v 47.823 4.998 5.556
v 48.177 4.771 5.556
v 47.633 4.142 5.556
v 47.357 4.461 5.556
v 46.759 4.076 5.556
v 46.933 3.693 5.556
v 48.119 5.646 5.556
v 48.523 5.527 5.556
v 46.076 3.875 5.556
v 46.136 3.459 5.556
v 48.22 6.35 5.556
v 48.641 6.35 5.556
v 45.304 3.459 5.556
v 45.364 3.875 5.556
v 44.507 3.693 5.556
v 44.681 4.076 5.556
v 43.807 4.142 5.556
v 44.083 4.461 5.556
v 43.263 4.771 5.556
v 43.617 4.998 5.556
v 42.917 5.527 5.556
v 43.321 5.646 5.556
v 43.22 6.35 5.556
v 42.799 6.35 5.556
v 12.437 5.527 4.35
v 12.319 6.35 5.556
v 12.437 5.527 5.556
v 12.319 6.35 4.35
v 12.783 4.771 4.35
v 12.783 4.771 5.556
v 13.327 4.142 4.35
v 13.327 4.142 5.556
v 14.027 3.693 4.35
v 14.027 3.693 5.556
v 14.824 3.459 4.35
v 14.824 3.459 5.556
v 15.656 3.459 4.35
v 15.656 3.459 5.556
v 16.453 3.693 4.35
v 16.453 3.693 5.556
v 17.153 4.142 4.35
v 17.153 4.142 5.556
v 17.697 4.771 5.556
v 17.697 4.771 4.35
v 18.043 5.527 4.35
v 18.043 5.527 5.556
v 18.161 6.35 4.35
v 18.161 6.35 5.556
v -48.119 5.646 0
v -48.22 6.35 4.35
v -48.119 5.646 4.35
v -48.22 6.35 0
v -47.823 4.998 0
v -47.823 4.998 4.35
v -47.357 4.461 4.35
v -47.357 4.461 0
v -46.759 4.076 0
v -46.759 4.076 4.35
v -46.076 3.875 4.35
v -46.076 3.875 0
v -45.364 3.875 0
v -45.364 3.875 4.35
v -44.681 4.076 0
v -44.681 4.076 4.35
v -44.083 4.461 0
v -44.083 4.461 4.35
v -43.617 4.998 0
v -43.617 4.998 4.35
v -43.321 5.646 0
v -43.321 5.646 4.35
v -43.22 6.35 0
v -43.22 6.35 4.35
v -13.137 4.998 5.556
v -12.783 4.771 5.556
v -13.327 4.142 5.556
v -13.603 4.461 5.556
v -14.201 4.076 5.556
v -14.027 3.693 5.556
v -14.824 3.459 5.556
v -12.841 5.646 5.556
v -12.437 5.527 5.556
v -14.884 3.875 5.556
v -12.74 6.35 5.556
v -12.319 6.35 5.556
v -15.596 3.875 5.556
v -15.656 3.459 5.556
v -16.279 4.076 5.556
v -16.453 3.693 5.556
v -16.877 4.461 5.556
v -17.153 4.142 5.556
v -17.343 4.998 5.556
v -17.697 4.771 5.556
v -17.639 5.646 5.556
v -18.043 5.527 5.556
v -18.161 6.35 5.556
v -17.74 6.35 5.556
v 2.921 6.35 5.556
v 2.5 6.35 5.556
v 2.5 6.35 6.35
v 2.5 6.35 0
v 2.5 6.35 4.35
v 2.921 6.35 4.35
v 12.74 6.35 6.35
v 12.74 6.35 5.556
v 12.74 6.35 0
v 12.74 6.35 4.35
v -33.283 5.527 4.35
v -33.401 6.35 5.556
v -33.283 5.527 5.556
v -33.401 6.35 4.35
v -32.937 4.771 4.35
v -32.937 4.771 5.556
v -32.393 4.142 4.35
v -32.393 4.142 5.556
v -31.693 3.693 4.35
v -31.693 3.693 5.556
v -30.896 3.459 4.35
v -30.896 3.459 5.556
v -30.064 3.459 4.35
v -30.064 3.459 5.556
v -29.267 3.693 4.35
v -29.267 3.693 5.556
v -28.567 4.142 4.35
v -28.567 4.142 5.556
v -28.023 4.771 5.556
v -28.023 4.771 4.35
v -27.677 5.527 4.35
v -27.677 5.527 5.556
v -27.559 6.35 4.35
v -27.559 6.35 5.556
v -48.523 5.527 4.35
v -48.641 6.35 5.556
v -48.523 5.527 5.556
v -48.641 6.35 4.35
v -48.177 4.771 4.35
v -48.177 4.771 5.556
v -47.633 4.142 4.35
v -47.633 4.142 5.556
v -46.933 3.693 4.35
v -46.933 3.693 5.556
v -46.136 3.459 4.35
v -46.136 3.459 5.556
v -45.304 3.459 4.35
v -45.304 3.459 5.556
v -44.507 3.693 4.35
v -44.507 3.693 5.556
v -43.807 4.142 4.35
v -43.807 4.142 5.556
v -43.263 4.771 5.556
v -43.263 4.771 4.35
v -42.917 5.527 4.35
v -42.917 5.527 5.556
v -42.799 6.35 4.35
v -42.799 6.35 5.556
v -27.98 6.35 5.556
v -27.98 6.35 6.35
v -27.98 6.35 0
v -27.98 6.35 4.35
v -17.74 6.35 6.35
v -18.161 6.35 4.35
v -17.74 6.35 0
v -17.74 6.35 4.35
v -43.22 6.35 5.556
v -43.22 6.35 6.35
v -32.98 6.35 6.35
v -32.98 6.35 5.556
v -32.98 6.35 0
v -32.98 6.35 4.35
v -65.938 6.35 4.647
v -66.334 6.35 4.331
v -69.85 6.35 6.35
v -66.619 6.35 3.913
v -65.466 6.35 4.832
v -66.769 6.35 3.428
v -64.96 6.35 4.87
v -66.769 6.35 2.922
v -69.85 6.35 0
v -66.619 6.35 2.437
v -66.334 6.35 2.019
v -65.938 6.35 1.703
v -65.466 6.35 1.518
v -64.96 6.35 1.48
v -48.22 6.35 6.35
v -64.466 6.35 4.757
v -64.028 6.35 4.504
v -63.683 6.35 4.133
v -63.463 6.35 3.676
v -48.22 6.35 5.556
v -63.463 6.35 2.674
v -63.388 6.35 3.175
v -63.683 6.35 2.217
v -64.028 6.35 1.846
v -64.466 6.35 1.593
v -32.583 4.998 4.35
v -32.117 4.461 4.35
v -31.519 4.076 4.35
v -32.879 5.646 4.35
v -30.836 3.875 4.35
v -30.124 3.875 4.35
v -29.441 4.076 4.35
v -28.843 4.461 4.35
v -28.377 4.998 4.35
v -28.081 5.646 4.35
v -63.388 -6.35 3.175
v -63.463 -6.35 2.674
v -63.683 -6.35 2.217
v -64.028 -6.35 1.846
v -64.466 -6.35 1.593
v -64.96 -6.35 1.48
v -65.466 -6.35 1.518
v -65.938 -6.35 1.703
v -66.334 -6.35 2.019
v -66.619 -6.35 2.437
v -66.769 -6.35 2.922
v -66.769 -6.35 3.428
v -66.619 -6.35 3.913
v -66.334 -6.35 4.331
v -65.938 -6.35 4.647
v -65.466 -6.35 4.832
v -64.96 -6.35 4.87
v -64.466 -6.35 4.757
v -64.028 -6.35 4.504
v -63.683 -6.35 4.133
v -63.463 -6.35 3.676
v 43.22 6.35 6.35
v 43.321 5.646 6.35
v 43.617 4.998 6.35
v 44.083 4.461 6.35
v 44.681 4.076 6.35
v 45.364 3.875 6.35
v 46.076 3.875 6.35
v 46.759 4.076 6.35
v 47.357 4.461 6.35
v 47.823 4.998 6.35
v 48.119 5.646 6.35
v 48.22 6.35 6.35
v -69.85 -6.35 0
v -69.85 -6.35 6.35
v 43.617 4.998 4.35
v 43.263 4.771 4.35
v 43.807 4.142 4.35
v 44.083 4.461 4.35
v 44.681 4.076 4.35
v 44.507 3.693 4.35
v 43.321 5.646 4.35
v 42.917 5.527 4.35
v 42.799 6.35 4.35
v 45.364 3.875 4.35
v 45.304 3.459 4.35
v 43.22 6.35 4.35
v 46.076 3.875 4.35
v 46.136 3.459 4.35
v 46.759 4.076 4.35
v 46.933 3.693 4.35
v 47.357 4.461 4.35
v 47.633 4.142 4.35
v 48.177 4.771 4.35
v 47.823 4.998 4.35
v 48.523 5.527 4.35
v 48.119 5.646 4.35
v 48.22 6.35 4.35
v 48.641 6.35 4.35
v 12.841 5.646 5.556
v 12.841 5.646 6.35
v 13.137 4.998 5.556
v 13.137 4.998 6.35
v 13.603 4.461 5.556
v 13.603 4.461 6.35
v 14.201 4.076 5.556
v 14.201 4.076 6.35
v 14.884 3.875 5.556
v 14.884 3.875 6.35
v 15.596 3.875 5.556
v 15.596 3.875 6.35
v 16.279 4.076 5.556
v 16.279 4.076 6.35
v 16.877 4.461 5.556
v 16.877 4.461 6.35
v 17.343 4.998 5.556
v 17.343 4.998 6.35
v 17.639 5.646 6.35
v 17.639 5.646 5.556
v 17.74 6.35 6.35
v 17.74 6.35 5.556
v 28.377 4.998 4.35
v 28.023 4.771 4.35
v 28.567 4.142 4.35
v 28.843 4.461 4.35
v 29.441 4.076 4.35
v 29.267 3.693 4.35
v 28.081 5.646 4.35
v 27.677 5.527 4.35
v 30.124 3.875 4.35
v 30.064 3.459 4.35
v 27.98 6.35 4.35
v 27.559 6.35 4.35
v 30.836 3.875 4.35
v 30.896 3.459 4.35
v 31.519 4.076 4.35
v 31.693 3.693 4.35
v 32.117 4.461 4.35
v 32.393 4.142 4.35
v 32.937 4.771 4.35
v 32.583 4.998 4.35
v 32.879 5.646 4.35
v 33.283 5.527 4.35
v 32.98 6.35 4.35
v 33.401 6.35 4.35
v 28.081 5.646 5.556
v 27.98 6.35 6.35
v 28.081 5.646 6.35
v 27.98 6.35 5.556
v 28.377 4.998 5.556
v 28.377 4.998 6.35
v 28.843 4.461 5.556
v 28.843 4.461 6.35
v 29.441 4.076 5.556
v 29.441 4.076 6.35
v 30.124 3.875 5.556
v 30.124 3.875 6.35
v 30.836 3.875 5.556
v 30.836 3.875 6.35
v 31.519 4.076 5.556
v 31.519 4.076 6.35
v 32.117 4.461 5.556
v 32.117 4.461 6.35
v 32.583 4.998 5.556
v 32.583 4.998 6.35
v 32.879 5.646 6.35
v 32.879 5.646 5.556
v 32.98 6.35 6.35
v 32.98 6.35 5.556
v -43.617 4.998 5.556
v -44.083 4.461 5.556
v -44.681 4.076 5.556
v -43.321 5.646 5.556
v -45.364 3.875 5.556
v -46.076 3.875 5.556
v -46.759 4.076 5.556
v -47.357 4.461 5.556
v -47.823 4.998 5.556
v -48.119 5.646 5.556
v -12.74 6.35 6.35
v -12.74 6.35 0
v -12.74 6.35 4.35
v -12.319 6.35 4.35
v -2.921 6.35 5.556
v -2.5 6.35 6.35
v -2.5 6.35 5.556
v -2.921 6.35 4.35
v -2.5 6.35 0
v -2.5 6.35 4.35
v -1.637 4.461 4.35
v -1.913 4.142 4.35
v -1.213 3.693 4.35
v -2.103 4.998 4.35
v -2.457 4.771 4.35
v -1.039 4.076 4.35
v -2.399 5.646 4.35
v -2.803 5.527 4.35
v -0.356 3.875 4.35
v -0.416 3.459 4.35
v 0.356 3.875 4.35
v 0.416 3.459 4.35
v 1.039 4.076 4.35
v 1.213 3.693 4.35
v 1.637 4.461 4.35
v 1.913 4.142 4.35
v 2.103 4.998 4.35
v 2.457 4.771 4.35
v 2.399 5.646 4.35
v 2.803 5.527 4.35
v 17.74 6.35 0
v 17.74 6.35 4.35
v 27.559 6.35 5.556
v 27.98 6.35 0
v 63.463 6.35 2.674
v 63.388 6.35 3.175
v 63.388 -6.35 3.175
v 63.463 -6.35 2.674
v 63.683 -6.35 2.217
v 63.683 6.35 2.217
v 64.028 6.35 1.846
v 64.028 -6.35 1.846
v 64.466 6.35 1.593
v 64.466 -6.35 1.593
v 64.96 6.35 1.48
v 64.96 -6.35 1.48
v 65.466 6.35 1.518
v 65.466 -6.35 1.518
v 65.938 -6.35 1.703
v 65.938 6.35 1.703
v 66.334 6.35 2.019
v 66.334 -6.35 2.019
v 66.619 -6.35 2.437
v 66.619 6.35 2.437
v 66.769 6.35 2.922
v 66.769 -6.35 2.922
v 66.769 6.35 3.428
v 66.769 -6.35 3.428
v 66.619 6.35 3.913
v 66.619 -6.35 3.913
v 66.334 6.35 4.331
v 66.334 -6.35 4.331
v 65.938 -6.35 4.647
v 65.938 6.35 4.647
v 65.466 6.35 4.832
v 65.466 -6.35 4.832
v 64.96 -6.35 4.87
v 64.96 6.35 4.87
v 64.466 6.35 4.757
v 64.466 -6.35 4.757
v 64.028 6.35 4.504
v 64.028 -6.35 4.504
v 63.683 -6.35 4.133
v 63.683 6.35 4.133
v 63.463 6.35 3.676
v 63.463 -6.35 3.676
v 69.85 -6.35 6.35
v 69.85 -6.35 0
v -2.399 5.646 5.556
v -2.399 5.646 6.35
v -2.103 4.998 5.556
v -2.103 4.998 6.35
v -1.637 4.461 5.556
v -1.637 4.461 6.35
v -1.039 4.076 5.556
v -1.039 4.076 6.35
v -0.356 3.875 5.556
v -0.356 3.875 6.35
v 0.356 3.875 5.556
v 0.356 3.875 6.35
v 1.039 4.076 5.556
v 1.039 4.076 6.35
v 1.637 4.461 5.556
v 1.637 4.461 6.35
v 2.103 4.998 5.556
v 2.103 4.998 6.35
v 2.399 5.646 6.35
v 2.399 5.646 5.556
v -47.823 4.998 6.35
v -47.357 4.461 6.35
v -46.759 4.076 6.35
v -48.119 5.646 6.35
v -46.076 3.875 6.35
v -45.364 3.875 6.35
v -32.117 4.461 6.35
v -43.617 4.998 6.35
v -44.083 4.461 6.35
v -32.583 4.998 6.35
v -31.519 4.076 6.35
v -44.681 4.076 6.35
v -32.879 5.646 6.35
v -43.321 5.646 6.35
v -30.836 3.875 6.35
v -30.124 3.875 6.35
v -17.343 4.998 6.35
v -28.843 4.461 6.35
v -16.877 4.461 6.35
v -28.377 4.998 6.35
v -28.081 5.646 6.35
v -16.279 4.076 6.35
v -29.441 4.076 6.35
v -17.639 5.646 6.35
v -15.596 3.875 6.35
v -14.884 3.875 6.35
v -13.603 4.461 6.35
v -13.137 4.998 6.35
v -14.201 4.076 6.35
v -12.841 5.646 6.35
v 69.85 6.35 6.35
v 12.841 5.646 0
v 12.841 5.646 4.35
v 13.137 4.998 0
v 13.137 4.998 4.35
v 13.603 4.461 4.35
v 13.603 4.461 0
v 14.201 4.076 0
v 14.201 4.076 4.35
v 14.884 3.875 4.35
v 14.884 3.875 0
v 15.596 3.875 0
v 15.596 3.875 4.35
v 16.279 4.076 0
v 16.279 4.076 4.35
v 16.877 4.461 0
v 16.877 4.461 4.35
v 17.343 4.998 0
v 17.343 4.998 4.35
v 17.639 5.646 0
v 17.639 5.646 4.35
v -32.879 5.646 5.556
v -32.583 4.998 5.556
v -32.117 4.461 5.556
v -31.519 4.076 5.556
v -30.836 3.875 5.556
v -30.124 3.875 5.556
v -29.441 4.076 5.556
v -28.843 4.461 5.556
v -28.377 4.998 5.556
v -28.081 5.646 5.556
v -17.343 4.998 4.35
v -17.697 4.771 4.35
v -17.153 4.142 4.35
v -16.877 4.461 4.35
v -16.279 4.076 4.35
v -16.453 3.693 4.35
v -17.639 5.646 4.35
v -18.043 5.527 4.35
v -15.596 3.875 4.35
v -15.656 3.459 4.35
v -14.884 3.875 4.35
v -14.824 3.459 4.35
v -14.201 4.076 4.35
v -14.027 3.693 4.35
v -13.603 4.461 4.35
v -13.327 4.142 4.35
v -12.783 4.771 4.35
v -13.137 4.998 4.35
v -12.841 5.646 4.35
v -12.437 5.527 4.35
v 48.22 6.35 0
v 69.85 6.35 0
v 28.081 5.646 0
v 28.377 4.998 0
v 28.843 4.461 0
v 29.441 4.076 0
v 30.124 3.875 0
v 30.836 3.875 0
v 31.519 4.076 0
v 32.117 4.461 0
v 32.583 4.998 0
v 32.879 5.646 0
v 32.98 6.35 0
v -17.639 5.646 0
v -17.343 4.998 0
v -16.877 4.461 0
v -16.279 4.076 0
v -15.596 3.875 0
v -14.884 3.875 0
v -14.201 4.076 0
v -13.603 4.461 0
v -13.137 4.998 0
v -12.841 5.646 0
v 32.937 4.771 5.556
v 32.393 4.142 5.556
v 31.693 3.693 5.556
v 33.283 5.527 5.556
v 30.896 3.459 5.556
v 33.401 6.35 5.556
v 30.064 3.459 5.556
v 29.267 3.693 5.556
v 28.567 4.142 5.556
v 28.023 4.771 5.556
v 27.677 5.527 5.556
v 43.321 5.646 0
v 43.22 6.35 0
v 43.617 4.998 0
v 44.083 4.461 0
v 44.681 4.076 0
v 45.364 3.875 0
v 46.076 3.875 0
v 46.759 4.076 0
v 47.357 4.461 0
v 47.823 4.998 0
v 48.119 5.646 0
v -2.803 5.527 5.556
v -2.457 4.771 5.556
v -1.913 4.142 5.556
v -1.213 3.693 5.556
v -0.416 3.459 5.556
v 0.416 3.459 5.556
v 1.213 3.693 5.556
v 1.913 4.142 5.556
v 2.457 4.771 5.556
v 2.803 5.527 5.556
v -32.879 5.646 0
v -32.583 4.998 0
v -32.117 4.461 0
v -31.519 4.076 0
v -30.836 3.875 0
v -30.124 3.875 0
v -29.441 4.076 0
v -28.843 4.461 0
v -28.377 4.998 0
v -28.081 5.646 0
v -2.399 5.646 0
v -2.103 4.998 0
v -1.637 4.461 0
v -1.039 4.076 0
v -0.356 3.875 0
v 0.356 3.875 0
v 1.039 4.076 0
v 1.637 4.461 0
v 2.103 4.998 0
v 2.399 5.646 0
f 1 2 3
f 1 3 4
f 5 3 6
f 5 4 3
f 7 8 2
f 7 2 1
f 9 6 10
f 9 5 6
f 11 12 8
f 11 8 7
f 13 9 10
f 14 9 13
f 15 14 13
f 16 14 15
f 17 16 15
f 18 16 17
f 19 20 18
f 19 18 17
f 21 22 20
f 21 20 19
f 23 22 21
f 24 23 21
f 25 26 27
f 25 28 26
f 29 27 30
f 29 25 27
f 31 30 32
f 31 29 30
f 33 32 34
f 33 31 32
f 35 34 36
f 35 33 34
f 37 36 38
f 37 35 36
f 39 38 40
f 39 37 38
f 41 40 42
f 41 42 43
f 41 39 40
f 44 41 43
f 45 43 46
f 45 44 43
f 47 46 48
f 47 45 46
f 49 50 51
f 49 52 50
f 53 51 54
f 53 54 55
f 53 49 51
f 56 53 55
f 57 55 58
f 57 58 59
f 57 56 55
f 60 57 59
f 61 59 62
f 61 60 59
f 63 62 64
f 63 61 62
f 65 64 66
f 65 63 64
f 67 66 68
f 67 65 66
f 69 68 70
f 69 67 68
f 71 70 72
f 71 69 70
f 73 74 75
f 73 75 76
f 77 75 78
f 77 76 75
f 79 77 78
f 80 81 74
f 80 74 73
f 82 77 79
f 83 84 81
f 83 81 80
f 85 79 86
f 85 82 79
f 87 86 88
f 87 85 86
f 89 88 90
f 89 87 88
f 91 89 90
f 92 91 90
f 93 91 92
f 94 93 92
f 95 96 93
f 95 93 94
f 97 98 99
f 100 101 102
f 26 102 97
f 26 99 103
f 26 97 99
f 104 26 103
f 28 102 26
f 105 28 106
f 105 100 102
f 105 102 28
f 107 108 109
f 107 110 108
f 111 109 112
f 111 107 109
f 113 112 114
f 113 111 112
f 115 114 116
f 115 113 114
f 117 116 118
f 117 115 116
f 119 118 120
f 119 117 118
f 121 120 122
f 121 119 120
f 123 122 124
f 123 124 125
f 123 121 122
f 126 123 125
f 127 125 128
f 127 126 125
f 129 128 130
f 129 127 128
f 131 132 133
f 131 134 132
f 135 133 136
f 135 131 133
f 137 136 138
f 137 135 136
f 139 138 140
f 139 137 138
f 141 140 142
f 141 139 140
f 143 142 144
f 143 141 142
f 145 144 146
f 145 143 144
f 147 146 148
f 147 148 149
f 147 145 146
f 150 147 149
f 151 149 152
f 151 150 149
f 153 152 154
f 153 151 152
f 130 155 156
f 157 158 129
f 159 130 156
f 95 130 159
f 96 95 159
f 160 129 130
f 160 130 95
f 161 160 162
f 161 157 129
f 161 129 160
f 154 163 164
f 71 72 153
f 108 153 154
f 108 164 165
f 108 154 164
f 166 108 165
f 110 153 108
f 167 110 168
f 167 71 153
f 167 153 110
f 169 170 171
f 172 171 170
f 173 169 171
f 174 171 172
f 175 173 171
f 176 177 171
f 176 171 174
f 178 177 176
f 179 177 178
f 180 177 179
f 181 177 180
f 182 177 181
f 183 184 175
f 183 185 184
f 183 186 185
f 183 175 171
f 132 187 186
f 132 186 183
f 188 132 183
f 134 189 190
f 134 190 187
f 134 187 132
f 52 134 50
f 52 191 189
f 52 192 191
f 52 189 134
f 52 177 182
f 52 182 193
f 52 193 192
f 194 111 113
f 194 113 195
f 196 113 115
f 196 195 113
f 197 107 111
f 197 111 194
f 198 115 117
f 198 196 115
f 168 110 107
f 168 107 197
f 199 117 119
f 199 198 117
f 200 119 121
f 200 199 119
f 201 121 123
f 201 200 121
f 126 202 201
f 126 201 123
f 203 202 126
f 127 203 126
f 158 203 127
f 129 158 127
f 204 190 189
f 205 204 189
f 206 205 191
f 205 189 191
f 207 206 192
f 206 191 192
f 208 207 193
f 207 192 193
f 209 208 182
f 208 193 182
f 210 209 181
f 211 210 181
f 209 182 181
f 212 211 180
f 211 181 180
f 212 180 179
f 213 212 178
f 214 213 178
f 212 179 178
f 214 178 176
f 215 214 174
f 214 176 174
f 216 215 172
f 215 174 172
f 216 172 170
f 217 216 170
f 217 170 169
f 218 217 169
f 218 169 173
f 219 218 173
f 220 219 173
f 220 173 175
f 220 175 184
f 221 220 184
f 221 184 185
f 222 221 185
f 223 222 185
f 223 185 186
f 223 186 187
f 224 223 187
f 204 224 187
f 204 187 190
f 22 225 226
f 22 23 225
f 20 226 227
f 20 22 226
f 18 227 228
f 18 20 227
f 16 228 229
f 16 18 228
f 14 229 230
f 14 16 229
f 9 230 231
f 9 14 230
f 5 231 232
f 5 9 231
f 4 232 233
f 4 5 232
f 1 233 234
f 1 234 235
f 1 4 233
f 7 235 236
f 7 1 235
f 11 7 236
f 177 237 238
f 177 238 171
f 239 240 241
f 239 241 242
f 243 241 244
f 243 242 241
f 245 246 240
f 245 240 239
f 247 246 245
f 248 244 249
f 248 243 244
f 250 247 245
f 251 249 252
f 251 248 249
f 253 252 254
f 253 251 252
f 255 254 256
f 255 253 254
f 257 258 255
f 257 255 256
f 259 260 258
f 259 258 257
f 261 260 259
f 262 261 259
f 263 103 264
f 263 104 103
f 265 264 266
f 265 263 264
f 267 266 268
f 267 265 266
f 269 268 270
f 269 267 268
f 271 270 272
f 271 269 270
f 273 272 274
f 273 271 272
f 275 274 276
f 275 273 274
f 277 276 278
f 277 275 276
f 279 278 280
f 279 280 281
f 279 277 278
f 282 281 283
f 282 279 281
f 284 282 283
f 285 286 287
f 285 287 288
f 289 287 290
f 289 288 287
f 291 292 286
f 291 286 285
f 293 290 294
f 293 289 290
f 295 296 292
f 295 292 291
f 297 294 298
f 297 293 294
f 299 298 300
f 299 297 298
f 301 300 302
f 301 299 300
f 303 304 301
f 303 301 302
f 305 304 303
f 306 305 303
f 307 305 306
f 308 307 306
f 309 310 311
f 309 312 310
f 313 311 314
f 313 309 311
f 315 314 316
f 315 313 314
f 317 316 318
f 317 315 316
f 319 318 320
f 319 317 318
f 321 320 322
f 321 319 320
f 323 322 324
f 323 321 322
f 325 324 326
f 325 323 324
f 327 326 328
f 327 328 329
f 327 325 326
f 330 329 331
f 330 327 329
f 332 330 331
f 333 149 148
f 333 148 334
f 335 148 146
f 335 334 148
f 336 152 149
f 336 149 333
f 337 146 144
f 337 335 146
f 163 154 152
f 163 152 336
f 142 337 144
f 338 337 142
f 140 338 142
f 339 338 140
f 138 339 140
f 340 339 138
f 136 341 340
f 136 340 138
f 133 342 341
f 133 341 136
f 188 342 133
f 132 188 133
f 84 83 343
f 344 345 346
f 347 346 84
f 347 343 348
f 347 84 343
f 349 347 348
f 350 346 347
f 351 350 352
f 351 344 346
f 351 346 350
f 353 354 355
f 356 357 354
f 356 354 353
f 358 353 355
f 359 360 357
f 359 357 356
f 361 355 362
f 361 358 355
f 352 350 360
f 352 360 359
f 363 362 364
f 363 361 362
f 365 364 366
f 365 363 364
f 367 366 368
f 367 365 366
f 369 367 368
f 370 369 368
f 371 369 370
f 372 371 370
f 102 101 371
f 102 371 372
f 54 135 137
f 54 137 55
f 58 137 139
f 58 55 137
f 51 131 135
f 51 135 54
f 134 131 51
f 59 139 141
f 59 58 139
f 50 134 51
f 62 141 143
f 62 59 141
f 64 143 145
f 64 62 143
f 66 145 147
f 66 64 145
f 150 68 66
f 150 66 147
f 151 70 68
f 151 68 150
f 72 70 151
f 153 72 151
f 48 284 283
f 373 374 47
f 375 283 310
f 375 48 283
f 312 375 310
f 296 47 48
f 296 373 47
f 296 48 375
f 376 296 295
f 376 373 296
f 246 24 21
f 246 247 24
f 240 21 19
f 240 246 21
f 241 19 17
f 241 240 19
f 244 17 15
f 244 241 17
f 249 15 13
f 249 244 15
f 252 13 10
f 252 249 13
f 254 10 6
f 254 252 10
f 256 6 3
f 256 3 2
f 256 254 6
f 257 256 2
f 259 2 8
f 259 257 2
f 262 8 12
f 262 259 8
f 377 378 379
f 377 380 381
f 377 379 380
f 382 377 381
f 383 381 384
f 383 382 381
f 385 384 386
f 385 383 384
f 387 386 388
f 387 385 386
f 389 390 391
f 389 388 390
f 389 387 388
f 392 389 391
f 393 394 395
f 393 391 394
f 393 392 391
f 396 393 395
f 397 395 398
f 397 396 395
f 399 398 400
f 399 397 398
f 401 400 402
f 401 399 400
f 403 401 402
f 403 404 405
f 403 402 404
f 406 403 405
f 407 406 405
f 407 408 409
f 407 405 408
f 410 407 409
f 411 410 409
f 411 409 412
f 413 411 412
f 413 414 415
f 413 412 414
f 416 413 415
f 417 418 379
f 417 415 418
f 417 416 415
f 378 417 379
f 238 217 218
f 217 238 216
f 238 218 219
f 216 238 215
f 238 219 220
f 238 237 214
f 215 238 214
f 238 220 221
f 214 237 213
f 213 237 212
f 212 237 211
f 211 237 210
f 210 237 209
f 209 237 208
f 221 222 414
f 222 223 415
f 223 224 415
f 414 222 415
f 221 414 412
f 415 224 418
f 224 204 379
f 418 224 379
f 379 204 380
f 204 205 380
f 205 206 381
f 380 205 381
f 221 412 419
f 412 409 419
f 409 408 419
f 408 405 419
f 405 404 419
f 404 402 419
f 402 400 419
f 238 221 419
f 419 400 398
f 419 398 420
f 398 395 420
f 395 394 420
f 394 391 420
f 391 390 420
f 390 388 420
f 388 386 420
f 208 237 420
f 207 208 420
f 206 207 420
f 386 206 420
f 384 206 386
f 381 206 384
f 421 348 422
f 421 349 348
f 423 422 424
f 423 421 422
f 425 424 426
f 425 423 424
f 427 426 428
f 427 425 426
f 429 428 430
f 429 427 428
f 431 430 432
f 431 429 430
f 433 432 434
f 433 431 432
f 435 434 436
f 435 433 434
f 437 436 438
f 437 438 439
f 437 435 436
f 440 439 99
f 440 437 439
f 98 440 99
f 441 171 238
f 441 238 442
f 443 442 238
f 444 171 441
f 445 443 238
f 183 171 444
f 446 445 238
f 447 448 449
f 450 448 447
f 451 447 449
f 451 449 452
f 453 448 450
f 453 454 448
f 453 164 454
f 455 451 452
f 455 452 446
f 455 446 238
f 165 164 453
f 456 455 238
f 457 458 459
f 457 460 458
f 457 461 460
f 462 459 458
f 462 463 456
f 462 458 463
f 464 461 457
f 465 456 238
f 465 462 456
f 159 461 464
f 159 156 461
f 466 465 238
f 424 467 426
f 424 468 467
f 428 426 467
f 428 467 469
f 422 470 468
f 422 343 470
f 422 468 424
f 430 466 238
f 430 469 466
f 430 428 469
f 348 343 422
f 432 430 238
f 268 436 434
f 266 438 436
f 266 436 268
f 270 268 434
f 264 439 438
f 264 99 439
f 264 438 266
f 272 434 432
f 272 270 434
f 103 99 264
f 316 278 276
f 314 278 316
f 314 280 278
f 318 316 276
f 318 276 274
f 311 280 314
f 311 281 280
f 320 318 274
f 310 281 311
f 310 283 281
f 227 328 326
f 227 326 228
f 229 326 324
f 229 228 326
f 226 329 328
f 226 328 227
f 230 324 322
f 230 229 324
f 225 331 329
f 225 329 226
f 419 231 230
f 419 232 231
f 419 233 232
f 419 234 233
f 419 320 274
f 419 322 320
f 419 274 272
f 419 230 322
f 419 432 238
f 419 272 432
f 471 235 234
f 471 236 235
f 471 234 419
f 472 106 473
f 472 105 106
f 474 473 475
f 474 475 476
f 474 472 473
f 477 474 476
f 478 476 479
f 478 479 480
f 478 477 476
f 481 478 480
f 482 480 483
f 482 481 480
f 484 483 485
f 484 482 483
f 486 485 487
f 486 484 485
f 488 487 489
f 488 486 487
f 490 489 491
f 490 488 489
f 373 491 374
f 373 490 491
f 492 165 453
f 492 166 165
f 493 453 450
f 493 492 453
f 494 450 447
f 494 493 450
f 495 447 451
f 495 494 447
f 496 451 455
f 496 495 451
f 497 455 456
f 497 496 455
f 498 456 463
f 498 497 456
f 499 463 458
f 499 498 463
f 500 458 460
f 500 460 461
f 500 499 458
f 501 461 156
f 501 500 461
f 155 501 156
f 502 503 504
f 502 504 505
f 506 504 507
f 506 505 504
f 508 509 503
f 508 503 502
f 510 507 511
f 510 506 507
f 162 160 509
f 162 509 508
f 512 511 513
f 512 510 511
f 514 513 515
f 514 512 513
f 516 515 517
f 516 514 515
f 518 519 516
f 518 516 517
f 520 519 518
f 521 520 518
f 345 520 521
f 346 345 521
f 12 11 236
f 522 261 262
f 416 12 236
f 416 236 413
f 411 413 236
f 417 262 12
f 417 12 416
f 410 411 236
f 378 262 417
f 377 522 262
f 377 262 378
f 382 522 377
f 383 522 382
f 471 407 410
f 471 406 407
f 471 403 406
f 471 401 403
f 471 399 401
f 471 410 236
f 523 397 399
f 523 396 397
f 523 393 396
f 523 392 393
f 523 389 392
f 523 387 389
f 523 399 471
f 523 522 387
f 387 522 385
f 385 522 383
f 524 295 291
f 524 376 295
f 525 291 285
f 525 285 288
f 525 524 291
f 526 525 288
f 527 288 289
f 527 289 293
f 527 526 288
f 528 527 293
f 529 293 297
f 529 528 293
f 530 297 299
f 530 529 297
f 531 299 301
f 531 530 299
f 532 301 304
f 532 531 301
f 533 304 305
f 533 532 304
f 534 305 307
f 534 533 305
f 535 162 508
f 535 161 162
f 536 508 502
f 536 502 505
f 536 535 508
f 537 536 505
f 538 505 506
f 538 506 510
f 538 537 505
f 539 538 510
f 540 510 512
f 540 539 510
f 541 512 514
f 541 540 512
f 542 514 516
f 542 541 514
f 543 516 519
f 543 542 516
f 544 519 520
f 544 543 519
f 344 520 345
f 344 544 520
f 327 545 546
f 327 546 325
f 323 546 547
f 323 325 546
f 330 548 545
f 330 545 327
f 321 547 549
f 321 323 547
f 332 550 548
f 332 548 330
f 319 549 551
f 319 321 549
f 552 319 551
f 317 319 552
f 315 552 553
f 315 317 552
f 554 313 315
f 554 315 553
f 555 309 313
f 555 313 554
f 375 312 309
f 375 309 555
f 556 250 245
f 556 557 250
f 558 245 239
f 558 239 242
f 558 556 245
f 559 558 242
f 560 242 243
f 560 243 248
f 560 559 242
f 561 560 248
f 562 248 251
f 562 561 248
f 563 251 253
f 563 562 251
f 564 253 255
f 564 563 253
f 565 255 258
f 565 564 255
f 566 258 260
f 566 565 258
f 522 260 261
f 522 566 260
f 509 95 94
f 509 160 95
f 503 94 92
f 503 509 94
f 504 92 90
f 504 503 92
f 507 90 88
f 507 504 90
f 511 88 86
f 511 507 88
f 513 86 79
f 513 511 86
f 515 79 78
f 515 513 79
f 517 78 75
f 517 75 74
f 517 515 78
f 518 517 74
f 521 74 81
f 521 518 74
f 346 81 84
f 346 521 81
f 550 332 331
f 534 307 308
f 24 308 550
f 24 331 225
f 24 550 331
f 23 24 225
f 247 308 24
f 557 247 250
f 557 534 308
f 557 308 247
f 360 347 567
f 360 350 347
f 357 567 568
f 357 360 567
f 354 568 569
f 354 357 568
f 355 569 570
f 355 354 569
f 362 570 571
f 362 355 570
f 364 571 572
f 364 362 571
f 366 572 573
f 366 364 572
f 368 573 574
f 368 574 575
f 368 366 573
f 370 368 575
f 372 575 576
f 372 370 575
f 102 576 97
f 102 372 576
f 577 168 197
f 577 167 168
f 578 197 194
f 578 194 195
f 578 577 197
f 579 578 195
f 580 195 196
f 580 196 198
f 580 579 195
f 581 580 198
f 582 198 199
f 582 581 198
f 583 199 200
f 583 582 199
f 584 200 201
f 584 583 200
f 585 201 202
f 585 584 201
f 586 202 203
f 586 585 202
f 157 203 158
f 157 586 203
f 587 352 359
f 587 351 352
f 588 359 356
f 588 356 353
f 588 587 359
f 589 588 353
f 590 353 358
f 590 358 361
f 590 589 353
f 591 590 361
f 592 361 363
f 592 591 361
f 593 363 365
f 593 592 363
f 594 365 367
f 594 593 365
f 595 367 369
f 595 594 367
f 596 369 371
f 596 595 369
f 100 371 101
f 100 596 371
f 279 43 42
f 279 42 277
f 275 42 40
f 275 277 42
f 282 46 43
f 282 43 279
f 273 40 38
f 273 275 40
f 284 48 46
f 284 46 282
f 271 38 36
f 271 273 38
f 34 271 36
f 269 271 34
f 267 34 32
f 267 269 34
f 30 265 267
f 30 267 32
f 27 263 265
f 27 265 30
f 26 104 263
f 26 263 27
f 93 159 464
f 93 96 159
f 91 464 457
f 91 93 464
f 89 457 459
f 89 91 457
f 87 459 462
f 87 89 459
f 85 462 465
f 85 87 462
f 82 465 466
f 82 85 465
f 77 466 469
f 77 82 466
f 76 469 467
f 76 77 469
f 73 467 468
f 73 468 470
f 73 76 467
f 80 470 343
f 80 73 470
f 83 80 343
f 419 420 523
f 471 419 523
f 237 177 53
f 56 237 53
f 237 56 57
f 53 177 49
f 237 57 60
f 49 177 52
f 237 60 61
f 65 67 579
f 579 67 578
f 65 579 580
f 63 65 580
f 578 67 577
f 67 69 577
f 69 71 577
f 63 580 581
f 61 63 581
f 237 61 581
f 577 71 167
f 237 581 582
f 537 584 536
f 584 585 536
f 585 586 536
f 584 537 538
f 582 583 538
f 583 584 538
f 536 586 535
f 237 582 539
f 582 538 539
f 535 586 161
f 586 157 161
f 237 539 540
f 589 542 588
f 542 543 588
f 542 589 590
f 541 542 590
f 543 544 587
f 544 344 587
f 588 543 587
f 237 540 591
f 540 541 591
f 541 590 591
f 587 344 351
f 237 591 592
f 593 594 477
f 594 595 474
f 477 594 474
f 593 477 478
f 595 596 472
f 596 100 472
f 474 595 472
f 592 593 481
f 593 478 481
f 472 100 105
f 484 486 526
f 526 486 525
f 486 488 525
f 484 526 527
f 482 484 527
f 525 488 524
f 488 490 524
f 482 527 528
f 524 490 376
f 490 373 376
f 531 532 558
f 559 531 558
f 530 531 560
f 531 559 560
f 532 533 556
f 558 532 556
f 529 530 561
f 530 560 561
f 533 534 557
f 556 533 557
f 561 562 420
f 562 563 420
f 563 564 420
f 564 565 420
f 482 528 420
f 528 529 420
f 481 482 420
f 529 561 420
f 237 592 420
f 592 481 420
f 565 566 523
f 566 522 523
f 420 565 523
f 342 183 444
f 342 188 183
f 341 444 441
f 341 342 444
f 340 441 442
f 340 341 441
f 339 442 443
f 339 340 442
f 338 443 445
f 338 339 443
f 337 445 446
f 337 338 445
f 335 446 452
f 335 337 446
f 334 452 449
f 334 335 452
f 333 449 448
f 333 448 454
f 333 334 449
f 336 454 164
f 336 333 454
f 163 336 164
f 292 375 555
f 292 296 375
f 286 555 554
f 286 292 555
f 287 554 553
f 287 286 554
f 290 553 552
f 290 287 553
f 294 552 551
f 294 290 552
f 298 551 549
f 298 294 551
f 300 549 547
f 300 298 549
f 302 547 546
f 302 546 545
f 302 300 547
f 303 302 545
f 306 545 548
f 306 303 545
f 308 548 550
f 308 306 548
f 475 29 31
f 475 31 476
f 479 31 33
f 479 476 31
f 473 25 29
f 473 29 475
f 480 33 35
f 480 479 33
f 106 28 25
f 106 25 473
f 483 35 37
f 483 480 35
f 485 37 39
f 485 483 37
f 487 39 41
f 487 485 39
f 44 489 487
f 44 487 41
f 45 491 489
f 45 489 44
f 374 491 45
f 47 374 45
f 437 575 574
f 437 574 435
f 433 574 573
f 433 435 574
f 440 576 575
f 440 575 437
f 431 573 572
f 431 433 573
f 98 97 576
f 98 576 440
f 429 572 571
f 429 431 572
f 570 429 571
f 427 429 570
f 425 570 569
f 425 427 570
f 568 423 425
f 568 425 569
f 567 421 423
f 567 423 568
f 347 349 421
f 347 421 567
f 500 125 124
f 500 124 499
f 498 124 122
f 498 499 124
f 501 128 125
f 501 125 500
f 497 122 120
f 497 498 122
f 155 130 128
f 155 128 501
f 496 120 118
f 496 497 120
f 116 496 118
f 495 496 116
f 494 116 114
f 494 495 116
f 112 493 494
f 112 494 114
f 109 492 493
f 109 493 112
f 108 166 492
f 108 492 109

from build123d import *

# Parameters (mm, degrees)
SKETCH1_W            = 139.7
SKETCH1_H            = 12.7
BOSS_EXTRUDE1_DEPTH  = 6.35
M3_CLEARANCE_HOLE1_D = 3.4
LPATTERN1_COUNT      = 4
LPATTERN1_PITCH      = 15.24
LPATTERN2_COUNT      = 4
LPATTERN2_PITCH      = 15.24


with BuildPart() as part:
    # Sketch1 → Boss-Extrude1 (new body)
    with BuildSketch(Plane.XY):
        Rectangle(SKETCH1_W, SKETCH1_H)
    extrude(amount=BOSS_EXTRUDE1_DEPTH)

    # M3 Clearance Hole1 (through all)
    with Locations(Plane(origin=(0, -6.35, 0), x_dir=(-1, 0, 0), z_dir=(0, -1, 0))):
        with Locations((65.0875, -3.175)):
            m3_clearance_hole1 = Hole(M3_CLEARANCE_HOLE1_D / 2)

    # Mirror1: M3 Clearance Hole1 across plane
    add(m3_clearance_hole1.mirror(Plane(origin=(0, 0, 0), x_dir=(0, 0, 1), z_dir=(1, 0, 0))), mode=Mode.SUBTRACT)

    # Sketch9 → Cut-Revolve1 (revolve, cut)
    with BuildSketch(Plane(origin=(0, 6.35, 0), x_dir=(1, 0, 0), z_dir=(0, 1, 0))):
        Polygon((2.5, -5.55625), (2.921, -5.55625), (2.921, -4.34975), (2.5, -4.34975), (2.5, 0), (0, 0), (0, -6.35), (2.5, -6.35), align=None)
    cut_revolve1 = revolve(axis=Axis((0, 6.35, 0), (0, 0, 1)), mode=Mode.SUBTRACT)

    # LPattern1: Cut-Revolve1 ×4
    with Locations(*[(-i * LPATTERN1_PITCH, 0, 0) for i in range(1, LPATTERN1_COUNT)]):
        add(cut_revolve1, mode=Mode.SUBTRACT)

    # LPattern2: Cut-Revolve1 ×4
    with Locations(*[(i * LPATTERN2_PITCH, 0, 0) for i in range(1, LPATTERN2_COUNT)]):
        add(cut_revolve1, mode=Mode.SUBTRACT)


solid = part.part
